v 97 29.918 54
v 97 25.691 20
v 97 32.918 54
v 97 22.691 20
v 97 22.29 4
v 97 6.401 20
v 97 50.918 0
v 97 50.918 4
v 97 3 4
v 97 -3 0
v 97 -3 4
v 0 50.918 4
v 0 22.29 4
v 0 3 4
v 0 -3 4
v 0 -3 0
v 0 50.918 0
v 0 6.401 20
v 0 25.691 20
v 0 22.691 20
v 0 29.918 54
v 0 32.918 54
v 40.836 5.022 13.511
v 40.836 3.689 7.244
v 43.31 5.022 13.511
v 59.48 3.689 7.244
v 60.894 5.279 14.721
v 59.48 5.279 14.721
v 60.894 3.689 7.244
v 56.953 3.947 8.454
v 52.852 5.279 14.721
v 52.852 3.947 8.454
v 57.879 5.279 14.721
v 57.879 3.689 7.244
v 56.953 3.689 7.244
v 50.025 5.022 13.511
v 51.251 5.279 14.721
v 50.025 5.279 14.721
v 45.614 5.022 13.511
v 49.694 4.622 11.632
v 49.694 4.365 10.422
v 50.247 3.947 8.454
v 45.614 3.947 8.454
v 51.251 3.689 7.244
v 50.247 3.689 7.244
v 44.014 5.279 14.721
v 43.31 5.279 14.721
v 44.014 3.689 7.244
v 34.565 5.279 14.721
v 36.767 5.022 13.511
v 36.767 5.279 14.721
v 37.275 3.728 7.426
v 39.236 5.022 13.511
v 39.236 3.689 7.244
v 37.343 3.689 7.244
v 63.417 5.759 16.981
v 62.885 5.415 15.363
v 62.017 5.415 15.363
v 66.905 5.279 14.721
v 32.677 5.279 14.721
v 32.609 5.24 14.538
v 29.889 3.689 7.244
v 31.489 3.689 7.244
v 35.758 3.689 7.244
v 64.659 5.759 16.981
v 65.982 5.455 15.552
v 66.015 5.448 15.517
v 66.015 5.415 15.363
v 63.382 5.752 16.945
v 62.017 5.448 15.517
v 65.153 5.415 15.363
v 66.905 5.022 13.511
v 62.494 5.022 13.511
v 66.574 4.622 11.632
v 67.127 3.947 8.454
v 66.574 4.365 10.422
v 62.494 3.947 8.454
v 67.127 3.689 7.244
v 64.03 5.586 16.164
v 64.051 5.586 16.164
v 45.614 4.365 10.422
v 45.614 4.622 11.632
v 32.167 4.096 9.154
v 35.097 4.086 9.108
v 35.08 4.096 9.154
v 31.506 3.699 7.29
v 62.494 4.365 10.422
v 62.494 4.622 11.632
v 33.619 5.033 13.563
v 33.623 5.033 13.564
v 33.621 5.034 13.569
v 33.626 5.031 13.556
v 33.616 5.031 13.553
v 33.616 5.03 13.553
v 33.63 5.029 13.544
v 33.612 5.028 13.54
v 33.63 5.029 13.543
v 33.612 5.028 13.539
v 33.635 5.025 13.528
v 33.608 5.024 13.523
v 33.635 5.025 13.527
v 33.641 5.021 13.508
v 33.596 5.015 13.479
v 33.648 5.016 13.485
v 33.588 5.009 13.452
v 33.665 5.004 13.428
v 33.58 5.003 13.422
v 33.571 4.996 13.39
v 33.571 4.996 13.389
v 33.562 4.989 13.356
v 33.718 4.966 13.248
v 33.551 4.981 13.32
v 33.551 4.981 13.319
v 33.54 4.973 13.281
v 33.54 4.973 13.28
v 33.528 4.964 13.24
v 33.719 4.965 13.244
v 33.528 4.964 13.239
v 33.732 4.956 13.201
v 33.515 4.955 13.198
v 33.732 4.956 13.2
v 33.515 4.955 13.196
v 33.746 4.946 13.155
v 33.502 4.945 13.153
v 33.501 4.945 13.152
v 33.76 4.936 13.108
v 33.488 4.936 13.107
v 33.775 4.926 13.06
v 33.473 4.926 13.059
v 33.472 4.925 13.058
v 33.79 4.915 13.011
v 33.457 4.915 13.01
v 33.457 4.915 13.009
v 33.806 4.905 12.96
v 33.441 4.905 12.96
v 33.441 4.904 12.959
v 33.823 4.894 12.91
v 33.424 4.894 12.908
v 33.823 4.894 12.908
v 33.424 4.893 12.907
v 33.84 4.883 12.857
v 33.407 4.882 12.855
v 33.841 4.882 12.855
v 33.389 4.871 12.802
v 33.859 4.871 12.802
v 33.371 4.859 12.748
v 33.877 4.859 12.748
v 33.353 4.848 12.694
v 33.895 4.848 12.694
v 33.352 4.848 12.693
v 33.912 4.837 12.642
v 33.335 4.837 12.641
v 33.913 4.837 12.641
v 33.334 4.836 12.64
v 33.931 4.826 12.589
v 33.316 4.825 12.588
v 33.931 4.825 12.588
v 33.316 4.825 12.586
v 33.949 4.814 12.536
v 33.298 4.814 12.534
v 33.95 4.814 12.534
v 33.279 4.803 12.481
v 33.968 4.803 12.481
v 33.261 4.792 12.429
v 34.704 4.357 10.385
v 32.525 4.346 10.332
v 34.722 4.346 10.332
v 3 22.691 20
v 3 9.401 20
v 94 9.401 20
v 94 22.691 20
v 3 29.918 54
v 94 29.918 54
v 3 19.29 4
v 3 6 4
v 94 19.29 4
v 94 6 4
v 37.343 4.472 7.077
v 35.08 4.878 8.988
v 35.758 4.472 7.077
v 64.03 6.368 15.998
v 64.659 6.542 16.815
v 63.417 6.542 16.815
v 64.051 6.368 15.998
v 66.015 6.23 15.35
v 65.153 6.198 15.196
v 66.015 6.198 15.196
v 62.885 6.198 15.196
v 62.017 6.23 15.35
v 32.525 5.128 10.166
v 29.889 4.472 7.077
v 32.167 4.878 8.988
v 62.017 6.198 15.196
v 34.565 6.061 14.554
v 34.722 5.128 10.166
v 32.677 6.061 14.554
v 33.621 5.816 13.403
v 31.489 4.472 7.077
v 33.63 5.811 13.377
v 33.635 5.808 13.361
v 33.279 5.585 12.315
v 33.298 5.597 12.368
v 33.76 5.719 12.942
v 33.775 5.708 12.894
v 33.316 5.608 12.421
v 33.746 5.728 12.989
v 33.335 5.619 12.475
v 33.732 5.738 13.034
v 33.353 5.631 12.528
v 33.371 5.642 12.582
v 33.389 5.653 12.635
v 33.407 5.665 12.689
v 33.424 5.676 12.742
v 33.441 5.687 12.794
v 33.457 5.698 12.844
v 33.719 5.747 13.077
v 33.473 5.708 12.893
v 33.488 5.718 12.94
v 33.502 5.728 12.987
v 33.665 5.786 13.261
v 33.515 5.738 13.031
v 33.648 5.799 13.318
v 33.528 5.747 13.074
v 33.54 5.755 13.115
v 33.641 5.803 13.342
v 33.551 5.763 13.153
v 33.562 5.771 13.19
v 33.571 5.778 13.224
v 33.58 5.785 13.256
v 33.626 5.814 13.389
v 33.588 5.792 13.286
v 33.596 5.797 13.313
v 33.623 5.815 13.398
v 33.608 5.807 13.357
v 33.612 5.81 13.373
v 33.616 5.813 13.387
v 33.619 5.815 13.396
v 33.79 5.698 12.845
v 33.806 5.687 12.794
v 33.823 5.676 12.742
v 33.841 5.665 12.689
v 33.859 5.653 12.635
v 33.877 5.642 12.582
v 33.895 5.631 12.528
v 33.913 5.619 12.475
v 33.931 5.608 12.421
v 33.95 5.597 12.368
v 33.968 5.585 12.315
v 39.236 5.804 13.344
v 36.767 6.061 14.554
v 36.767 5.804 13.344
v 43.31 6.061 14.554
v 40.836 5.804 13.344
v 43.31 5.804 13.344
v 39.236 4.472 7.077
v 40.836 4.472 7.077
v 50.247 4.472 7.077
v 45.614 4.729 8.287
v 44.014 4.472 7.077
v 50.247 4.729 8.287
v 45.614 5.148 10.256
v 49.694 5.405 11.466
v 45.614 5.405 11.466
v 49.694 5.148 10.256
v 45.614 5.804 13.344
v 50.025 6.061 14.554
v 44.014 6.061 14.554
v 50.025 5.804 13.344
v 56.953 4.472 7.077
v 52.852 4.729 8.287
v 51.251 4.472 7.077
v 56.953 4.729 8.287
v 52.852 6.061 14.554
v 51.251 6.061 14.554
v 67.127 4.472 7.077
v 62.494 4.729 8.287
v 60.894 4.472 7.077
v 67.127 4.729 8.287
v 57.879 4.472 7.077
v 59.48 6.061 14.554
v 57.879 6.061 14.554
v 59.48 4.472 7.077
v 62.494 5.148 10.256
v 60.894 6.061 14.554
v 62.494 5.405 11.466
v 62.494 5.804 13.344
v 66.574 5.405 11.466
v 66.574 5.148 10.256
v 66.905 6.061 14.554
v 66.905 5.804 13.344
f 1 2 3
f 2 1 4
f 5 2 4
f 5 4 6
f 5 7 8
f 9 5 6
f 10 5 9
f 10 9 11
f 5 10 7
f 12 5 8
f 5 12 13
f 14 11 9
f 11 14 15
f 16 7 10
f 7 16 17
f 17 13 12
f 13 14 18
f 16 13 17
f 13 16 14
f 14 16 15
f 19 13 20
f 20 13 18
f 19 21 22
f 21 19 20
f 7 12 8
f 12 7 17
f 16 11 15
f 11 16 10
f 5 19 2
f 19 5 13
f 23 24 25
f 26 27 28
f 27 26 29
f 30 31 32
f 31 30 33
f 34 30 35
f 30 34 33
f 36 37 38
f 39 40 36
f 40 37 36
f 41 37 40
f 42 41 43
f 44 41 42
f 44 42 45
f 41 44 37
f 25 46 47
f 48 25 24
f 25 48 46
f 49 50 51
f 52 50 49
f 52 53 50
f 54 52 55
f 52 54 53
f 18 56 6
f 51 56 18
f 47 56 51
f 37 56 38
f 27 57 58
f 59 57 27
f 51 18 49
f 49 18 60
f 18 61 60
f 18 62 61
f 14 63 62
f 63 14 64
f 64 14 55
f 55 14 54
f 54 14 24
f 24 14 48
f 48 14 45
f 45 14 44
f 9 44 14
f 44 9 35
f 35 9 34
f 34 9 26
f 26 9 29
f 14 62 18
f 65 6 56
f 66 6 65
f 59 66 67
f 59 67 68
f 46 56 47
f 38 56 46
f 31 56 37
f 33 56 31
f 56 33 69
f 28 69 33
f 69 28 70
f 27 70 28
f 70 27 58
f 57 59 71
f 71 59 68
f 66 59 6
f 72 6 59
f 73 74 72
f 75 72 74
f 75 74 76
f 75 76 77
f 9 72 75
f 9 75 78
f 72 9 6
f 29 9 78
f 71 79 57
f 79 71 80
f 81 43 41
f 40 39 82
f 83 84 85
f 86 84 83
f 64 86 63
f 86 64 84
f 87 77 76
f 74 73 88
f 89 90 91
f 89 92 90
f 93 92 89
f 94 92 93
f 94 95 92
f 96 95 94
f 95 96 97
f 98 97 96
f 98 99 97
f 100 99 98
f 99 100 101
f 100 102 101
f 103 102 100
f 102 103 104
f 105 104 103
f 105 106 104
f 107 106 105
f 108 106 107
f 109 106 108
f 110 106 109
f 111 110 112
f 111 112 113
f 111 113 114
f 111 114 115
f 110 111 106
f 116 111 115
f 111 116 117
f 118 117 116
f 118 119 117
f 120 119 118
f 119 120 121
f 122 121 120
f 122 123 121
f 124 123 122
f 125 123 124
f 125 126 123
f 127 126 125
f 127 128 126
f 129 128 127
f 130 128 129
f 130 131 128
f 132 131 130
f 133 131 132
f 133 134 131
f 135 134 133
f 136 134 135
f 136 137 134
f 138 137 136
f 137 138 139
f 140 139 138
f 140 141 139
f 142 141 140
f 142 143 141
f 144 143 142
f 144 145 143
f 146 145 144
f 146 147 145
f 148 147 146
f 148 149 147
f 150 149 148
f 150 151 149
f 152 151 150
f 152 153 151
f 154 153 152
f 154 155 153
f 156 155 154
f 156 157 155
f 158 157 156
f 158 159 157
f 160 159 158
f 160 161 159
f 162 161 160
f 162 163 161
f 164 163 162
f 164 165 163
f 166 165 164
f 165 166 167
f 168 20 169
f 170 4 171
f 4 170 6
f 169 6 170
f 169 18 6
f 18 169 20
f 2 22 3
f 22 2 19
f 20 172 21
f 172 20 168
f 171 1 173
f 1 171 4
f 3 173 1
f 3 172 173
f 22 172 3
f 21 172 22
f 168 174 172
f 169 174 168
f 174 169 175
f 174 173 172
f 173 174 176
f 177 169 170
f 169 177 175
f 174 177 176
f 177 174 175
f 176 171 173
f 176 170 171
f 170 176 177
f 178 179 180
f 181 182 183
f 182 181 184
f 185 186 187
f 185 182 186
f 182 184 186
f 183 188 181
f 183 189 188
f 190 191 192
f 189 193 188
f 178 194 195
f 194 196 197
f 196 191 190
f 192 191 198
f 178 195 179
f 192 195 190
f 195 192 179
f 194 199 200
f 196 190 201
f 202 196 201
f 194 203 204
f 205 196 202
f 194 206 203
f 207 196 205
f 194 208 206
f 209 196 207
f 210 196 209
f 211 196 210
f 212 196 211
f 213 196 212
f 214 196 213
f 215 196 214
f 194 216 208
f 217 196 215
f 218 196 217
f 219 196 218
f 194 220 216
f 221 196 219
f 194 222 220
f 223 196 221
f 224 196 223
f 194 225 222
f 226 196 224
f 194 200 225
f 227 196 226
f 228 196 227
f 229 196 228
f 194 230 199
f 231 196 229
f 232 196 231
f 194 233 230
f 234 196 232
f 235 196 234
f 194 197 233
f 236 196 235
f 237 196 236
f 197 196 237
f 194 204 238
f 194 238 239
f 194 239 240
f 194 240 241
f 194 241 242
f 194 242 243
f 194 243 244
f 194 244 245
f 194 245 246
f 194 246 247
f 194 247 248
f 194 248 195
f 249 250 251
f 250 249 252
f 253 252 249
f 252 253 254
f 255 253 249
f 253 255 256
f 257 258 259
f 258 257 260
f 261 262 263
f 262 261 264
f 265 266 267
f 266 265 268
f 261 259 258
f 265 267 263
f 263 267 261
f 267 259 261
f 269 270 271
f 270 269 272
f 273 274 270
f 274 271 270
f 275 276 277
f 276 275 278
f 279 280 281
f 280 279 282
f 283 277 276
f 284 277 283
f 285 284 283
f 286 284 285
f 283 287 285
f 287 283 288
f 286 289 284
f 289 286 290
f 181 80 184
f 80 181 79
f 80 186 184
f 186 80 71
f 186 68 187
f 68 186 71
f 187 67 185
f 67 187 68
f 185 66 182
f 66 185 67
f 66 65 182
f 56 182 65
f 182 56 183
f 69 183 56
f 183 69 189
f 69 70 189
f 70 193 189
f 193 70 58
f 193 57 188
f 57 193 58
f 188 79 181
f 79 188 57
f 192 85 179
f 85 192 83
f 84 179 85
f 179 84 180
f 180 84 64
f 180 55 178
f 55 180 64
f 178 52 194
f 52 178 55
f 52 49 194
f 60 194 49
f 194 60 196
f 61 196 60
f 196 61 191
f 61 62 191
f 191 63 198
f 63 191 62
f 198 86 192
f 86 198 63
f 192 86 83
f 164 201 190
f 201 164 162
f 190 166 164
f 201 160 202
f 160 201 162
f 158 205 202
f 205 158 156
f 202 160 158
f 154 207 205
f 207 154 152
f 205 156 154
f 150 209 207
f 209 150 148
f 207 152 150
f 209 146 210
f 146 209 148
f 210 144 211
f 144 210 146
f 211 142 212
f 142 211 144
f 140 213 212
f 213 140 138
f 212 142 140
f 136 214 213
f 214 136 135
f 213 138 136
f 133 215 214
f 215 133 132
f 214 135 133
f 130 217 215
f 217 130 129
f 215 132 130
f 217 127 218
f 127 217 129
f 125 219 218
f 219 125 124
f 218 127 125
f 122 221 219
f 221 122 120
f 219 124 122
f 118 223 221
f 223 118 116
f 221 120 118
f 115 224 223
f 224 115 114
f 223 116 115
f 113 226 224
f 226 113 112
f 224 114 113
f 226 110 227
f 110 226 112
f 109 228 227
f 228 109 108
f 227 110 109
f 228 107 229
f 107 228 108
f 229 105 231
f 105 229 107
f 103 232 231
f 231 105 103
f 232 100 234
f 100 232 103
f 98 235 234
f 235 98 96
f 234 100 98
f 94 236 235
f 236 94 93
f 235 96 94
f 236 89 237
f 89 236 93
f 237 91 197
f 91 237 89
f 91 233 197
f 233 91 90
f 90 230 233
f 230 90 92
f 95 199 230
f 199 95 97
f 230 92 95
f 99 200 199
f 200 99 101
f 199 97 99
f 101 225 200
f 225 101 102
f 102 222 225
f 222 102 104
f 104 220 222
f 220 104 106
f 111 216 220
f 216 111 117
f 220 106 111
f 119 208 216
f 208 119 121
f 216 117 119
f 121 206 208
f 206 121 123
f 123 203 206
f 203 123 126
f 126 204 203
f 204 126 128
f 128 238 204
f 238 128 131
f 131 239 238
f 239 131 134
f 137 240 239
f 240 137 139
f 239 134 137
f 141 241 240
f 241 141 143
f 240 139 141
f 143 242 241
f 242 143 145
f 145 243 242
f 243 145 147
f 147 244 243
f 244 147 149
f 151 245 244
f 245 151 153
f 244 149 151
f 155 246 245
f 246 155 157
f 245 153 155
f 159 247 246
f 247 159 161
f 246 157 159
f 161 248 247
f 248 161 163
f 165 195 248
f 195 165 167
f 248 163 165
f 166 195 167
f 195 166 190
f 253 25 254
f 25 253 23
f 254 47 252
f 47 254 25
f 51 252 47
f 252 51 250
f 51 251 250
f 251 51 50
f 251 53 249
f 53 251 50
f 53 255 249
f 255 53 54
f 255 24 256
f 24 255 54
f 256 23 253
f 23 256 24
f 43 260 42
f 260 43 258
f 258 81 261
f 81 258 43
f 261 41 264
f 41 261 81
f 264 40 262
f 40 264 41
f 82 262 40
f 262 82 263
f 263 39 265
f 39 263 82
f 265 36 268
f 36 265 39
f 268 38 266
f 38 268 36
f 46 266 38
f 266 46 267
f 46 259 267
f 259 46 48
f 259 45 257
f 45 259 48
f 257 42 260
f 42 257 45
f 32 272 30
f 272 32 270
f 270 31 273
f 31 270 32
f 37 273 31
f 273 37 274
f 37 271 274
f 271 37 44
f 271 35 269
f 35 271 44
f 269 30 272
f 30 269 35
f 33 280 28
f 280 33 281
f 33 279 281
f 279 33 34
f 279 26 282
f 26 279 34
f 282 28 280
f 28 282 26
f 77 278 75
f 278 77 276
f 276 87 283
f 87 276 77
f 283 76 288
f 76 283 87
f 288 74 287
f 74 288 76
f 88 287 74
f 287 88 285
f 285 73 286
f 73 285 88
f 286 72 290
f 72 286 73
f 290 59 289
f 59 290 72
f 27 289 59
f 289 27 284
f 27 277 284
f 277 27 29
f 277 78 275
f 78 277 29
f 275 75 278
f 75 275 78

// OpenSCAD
// OpenSCAD 2021.01 — medidas em milímetros.
cartao_largura = 90;          // Largura dos cartões.
cartao_altura = 50;           // Altura dos cartões.
pilha = 12;                  // Espessura da pilha, perpendicular ao encosto.
folga_largura = 1;           // Folga total na largura.
folga_pilha = 1;             // Folga total na espessura.
inclinacao = 12;             // Inclinação para trás, em graus.
parede = 3;                  // Espessura horizontal das paredes.
base = 4;                    // Espessura da base.
altura_frente = 20;          // Altura total da borda frontal.
margem_frontal = 3;          // Avanço da base à frente do bolso.
recuo_bolso = 3;             // Posição frontal do bolso sobre a base.
pe_traseiro = 18;            // Extensão estabilizadora atrás do encosto.
gravacao = 0.8;              // Profundidade perpendicular da gravação.
texto_tamanho = 8;           // Tamanho nominal das letras.
texto_altura = 12;           // Altura do centro do texto sobre a mesa.
epsilon = 0.02;             // Sobreposição externa do corte.
zero = 0;                   // Constante geométrica.
um = 1;                     // Constante geométrica.
dois = 2;                   // Divisor para centralização.
angulo_reto = 90;            // Ângulo reto, em graus.
resolucao = 48;              // Resolução de curvas.

// Dimensões derivadas.
largura_interna = cartao_largura + folga_largura;
largura = largura_interna + dois * parede;
altura = base + cartao_altura;
passo = tan(inclinacao);
abertura = (pilha + folga_pilha) / cos(inclinacao);
inicio_base = -margem_frontal;
fim_base = traseira_externa(altura) + pe_traseiro;
profundidade = fim_base - inicio_base;

$fn = resolucao;

function frente_externa(z) =
    recuo_bolso + (z - base) * passo;

function frente_interna(z) =
    frente_externa(z) + parede;

function traseira_interna(z) =
    frente_interna(z) + abertura;

function traseira_externa(z) =
    traseira_interna(z) + parede;

// Extruda um perfil no plano YZ ao longo da largura X.
module perfil_lateral(pontos, extensao) {
    rotate([angulo_reto, zero, angulo_reto])
        linear_extrude(height = extensao, convexity = resolucao)
            polygon(points = pontos);
}

module corpo() {
    union() {
        // Base contínua, incluindo o pé traseiro.
        translate([zero, inicio_base, zero])
            cube([largura, profundidade, base]);

        // Volume inferior: frente, fundo e laterais do bolso.
        perfil_lateral([
            [frente_externa(base), base],
            [traseira_externa(base), base],
            [traseira_externa(altura_frente), altura_frente],
            [frente_externa(altura_frente), altura_frente]
        ], largura);

        // Encosto com inclinação constante.
        perfil_lateral([
            [traseira_interna(base), base],
            [traseira_externa(base), base],
            [traseira_externa(altura), altura],
            [traseira_interna(altura), altura]
        ], largura);
    }
}

module vazio_bolso() {
    translate([parede, zero, zero])
        perfil_lateral([
            [frente_interna(base), base],
            [traseira_interna(base), base],
            [traseira_interna(altura + epsilon), altura + epsilon],
            [frente_interna(altura + epsilon), altura + epsilon]
        ], largura_interna);
}

module letras_gravadas() {
    // O eixo local Z aponta para fora da face frontal inclinada.
    translate([
        largura / dois,
        frente_externa(texto_altura),
        texto_altura
    ])
        rotate([angulo_reto - inclinacao, zero, zero])
            translate([zero, zero, -gravacao])
                linear_extrude(
                    height = gravacao + epsilon,
                    convexity = resolucao
                )
                    text(
                        "ATELIÊ",
                        size = texto_tamanho,
                        font = "Liberation Sans:style=Bold",
                        halign = "center",
                        valign = "center"
                    );
}

echo("Largura (mm):", largura);
echo("Profundidade (mm):", profundidade);
echo("Altura (mm):", altura);

// Peça única; base plana em Z = 0.
// Paredes inclinadas têm espessura normal superior a 2 mm.
difference() {
    corpo();
    vazio_bolso();
    letras_gravadas();
}
